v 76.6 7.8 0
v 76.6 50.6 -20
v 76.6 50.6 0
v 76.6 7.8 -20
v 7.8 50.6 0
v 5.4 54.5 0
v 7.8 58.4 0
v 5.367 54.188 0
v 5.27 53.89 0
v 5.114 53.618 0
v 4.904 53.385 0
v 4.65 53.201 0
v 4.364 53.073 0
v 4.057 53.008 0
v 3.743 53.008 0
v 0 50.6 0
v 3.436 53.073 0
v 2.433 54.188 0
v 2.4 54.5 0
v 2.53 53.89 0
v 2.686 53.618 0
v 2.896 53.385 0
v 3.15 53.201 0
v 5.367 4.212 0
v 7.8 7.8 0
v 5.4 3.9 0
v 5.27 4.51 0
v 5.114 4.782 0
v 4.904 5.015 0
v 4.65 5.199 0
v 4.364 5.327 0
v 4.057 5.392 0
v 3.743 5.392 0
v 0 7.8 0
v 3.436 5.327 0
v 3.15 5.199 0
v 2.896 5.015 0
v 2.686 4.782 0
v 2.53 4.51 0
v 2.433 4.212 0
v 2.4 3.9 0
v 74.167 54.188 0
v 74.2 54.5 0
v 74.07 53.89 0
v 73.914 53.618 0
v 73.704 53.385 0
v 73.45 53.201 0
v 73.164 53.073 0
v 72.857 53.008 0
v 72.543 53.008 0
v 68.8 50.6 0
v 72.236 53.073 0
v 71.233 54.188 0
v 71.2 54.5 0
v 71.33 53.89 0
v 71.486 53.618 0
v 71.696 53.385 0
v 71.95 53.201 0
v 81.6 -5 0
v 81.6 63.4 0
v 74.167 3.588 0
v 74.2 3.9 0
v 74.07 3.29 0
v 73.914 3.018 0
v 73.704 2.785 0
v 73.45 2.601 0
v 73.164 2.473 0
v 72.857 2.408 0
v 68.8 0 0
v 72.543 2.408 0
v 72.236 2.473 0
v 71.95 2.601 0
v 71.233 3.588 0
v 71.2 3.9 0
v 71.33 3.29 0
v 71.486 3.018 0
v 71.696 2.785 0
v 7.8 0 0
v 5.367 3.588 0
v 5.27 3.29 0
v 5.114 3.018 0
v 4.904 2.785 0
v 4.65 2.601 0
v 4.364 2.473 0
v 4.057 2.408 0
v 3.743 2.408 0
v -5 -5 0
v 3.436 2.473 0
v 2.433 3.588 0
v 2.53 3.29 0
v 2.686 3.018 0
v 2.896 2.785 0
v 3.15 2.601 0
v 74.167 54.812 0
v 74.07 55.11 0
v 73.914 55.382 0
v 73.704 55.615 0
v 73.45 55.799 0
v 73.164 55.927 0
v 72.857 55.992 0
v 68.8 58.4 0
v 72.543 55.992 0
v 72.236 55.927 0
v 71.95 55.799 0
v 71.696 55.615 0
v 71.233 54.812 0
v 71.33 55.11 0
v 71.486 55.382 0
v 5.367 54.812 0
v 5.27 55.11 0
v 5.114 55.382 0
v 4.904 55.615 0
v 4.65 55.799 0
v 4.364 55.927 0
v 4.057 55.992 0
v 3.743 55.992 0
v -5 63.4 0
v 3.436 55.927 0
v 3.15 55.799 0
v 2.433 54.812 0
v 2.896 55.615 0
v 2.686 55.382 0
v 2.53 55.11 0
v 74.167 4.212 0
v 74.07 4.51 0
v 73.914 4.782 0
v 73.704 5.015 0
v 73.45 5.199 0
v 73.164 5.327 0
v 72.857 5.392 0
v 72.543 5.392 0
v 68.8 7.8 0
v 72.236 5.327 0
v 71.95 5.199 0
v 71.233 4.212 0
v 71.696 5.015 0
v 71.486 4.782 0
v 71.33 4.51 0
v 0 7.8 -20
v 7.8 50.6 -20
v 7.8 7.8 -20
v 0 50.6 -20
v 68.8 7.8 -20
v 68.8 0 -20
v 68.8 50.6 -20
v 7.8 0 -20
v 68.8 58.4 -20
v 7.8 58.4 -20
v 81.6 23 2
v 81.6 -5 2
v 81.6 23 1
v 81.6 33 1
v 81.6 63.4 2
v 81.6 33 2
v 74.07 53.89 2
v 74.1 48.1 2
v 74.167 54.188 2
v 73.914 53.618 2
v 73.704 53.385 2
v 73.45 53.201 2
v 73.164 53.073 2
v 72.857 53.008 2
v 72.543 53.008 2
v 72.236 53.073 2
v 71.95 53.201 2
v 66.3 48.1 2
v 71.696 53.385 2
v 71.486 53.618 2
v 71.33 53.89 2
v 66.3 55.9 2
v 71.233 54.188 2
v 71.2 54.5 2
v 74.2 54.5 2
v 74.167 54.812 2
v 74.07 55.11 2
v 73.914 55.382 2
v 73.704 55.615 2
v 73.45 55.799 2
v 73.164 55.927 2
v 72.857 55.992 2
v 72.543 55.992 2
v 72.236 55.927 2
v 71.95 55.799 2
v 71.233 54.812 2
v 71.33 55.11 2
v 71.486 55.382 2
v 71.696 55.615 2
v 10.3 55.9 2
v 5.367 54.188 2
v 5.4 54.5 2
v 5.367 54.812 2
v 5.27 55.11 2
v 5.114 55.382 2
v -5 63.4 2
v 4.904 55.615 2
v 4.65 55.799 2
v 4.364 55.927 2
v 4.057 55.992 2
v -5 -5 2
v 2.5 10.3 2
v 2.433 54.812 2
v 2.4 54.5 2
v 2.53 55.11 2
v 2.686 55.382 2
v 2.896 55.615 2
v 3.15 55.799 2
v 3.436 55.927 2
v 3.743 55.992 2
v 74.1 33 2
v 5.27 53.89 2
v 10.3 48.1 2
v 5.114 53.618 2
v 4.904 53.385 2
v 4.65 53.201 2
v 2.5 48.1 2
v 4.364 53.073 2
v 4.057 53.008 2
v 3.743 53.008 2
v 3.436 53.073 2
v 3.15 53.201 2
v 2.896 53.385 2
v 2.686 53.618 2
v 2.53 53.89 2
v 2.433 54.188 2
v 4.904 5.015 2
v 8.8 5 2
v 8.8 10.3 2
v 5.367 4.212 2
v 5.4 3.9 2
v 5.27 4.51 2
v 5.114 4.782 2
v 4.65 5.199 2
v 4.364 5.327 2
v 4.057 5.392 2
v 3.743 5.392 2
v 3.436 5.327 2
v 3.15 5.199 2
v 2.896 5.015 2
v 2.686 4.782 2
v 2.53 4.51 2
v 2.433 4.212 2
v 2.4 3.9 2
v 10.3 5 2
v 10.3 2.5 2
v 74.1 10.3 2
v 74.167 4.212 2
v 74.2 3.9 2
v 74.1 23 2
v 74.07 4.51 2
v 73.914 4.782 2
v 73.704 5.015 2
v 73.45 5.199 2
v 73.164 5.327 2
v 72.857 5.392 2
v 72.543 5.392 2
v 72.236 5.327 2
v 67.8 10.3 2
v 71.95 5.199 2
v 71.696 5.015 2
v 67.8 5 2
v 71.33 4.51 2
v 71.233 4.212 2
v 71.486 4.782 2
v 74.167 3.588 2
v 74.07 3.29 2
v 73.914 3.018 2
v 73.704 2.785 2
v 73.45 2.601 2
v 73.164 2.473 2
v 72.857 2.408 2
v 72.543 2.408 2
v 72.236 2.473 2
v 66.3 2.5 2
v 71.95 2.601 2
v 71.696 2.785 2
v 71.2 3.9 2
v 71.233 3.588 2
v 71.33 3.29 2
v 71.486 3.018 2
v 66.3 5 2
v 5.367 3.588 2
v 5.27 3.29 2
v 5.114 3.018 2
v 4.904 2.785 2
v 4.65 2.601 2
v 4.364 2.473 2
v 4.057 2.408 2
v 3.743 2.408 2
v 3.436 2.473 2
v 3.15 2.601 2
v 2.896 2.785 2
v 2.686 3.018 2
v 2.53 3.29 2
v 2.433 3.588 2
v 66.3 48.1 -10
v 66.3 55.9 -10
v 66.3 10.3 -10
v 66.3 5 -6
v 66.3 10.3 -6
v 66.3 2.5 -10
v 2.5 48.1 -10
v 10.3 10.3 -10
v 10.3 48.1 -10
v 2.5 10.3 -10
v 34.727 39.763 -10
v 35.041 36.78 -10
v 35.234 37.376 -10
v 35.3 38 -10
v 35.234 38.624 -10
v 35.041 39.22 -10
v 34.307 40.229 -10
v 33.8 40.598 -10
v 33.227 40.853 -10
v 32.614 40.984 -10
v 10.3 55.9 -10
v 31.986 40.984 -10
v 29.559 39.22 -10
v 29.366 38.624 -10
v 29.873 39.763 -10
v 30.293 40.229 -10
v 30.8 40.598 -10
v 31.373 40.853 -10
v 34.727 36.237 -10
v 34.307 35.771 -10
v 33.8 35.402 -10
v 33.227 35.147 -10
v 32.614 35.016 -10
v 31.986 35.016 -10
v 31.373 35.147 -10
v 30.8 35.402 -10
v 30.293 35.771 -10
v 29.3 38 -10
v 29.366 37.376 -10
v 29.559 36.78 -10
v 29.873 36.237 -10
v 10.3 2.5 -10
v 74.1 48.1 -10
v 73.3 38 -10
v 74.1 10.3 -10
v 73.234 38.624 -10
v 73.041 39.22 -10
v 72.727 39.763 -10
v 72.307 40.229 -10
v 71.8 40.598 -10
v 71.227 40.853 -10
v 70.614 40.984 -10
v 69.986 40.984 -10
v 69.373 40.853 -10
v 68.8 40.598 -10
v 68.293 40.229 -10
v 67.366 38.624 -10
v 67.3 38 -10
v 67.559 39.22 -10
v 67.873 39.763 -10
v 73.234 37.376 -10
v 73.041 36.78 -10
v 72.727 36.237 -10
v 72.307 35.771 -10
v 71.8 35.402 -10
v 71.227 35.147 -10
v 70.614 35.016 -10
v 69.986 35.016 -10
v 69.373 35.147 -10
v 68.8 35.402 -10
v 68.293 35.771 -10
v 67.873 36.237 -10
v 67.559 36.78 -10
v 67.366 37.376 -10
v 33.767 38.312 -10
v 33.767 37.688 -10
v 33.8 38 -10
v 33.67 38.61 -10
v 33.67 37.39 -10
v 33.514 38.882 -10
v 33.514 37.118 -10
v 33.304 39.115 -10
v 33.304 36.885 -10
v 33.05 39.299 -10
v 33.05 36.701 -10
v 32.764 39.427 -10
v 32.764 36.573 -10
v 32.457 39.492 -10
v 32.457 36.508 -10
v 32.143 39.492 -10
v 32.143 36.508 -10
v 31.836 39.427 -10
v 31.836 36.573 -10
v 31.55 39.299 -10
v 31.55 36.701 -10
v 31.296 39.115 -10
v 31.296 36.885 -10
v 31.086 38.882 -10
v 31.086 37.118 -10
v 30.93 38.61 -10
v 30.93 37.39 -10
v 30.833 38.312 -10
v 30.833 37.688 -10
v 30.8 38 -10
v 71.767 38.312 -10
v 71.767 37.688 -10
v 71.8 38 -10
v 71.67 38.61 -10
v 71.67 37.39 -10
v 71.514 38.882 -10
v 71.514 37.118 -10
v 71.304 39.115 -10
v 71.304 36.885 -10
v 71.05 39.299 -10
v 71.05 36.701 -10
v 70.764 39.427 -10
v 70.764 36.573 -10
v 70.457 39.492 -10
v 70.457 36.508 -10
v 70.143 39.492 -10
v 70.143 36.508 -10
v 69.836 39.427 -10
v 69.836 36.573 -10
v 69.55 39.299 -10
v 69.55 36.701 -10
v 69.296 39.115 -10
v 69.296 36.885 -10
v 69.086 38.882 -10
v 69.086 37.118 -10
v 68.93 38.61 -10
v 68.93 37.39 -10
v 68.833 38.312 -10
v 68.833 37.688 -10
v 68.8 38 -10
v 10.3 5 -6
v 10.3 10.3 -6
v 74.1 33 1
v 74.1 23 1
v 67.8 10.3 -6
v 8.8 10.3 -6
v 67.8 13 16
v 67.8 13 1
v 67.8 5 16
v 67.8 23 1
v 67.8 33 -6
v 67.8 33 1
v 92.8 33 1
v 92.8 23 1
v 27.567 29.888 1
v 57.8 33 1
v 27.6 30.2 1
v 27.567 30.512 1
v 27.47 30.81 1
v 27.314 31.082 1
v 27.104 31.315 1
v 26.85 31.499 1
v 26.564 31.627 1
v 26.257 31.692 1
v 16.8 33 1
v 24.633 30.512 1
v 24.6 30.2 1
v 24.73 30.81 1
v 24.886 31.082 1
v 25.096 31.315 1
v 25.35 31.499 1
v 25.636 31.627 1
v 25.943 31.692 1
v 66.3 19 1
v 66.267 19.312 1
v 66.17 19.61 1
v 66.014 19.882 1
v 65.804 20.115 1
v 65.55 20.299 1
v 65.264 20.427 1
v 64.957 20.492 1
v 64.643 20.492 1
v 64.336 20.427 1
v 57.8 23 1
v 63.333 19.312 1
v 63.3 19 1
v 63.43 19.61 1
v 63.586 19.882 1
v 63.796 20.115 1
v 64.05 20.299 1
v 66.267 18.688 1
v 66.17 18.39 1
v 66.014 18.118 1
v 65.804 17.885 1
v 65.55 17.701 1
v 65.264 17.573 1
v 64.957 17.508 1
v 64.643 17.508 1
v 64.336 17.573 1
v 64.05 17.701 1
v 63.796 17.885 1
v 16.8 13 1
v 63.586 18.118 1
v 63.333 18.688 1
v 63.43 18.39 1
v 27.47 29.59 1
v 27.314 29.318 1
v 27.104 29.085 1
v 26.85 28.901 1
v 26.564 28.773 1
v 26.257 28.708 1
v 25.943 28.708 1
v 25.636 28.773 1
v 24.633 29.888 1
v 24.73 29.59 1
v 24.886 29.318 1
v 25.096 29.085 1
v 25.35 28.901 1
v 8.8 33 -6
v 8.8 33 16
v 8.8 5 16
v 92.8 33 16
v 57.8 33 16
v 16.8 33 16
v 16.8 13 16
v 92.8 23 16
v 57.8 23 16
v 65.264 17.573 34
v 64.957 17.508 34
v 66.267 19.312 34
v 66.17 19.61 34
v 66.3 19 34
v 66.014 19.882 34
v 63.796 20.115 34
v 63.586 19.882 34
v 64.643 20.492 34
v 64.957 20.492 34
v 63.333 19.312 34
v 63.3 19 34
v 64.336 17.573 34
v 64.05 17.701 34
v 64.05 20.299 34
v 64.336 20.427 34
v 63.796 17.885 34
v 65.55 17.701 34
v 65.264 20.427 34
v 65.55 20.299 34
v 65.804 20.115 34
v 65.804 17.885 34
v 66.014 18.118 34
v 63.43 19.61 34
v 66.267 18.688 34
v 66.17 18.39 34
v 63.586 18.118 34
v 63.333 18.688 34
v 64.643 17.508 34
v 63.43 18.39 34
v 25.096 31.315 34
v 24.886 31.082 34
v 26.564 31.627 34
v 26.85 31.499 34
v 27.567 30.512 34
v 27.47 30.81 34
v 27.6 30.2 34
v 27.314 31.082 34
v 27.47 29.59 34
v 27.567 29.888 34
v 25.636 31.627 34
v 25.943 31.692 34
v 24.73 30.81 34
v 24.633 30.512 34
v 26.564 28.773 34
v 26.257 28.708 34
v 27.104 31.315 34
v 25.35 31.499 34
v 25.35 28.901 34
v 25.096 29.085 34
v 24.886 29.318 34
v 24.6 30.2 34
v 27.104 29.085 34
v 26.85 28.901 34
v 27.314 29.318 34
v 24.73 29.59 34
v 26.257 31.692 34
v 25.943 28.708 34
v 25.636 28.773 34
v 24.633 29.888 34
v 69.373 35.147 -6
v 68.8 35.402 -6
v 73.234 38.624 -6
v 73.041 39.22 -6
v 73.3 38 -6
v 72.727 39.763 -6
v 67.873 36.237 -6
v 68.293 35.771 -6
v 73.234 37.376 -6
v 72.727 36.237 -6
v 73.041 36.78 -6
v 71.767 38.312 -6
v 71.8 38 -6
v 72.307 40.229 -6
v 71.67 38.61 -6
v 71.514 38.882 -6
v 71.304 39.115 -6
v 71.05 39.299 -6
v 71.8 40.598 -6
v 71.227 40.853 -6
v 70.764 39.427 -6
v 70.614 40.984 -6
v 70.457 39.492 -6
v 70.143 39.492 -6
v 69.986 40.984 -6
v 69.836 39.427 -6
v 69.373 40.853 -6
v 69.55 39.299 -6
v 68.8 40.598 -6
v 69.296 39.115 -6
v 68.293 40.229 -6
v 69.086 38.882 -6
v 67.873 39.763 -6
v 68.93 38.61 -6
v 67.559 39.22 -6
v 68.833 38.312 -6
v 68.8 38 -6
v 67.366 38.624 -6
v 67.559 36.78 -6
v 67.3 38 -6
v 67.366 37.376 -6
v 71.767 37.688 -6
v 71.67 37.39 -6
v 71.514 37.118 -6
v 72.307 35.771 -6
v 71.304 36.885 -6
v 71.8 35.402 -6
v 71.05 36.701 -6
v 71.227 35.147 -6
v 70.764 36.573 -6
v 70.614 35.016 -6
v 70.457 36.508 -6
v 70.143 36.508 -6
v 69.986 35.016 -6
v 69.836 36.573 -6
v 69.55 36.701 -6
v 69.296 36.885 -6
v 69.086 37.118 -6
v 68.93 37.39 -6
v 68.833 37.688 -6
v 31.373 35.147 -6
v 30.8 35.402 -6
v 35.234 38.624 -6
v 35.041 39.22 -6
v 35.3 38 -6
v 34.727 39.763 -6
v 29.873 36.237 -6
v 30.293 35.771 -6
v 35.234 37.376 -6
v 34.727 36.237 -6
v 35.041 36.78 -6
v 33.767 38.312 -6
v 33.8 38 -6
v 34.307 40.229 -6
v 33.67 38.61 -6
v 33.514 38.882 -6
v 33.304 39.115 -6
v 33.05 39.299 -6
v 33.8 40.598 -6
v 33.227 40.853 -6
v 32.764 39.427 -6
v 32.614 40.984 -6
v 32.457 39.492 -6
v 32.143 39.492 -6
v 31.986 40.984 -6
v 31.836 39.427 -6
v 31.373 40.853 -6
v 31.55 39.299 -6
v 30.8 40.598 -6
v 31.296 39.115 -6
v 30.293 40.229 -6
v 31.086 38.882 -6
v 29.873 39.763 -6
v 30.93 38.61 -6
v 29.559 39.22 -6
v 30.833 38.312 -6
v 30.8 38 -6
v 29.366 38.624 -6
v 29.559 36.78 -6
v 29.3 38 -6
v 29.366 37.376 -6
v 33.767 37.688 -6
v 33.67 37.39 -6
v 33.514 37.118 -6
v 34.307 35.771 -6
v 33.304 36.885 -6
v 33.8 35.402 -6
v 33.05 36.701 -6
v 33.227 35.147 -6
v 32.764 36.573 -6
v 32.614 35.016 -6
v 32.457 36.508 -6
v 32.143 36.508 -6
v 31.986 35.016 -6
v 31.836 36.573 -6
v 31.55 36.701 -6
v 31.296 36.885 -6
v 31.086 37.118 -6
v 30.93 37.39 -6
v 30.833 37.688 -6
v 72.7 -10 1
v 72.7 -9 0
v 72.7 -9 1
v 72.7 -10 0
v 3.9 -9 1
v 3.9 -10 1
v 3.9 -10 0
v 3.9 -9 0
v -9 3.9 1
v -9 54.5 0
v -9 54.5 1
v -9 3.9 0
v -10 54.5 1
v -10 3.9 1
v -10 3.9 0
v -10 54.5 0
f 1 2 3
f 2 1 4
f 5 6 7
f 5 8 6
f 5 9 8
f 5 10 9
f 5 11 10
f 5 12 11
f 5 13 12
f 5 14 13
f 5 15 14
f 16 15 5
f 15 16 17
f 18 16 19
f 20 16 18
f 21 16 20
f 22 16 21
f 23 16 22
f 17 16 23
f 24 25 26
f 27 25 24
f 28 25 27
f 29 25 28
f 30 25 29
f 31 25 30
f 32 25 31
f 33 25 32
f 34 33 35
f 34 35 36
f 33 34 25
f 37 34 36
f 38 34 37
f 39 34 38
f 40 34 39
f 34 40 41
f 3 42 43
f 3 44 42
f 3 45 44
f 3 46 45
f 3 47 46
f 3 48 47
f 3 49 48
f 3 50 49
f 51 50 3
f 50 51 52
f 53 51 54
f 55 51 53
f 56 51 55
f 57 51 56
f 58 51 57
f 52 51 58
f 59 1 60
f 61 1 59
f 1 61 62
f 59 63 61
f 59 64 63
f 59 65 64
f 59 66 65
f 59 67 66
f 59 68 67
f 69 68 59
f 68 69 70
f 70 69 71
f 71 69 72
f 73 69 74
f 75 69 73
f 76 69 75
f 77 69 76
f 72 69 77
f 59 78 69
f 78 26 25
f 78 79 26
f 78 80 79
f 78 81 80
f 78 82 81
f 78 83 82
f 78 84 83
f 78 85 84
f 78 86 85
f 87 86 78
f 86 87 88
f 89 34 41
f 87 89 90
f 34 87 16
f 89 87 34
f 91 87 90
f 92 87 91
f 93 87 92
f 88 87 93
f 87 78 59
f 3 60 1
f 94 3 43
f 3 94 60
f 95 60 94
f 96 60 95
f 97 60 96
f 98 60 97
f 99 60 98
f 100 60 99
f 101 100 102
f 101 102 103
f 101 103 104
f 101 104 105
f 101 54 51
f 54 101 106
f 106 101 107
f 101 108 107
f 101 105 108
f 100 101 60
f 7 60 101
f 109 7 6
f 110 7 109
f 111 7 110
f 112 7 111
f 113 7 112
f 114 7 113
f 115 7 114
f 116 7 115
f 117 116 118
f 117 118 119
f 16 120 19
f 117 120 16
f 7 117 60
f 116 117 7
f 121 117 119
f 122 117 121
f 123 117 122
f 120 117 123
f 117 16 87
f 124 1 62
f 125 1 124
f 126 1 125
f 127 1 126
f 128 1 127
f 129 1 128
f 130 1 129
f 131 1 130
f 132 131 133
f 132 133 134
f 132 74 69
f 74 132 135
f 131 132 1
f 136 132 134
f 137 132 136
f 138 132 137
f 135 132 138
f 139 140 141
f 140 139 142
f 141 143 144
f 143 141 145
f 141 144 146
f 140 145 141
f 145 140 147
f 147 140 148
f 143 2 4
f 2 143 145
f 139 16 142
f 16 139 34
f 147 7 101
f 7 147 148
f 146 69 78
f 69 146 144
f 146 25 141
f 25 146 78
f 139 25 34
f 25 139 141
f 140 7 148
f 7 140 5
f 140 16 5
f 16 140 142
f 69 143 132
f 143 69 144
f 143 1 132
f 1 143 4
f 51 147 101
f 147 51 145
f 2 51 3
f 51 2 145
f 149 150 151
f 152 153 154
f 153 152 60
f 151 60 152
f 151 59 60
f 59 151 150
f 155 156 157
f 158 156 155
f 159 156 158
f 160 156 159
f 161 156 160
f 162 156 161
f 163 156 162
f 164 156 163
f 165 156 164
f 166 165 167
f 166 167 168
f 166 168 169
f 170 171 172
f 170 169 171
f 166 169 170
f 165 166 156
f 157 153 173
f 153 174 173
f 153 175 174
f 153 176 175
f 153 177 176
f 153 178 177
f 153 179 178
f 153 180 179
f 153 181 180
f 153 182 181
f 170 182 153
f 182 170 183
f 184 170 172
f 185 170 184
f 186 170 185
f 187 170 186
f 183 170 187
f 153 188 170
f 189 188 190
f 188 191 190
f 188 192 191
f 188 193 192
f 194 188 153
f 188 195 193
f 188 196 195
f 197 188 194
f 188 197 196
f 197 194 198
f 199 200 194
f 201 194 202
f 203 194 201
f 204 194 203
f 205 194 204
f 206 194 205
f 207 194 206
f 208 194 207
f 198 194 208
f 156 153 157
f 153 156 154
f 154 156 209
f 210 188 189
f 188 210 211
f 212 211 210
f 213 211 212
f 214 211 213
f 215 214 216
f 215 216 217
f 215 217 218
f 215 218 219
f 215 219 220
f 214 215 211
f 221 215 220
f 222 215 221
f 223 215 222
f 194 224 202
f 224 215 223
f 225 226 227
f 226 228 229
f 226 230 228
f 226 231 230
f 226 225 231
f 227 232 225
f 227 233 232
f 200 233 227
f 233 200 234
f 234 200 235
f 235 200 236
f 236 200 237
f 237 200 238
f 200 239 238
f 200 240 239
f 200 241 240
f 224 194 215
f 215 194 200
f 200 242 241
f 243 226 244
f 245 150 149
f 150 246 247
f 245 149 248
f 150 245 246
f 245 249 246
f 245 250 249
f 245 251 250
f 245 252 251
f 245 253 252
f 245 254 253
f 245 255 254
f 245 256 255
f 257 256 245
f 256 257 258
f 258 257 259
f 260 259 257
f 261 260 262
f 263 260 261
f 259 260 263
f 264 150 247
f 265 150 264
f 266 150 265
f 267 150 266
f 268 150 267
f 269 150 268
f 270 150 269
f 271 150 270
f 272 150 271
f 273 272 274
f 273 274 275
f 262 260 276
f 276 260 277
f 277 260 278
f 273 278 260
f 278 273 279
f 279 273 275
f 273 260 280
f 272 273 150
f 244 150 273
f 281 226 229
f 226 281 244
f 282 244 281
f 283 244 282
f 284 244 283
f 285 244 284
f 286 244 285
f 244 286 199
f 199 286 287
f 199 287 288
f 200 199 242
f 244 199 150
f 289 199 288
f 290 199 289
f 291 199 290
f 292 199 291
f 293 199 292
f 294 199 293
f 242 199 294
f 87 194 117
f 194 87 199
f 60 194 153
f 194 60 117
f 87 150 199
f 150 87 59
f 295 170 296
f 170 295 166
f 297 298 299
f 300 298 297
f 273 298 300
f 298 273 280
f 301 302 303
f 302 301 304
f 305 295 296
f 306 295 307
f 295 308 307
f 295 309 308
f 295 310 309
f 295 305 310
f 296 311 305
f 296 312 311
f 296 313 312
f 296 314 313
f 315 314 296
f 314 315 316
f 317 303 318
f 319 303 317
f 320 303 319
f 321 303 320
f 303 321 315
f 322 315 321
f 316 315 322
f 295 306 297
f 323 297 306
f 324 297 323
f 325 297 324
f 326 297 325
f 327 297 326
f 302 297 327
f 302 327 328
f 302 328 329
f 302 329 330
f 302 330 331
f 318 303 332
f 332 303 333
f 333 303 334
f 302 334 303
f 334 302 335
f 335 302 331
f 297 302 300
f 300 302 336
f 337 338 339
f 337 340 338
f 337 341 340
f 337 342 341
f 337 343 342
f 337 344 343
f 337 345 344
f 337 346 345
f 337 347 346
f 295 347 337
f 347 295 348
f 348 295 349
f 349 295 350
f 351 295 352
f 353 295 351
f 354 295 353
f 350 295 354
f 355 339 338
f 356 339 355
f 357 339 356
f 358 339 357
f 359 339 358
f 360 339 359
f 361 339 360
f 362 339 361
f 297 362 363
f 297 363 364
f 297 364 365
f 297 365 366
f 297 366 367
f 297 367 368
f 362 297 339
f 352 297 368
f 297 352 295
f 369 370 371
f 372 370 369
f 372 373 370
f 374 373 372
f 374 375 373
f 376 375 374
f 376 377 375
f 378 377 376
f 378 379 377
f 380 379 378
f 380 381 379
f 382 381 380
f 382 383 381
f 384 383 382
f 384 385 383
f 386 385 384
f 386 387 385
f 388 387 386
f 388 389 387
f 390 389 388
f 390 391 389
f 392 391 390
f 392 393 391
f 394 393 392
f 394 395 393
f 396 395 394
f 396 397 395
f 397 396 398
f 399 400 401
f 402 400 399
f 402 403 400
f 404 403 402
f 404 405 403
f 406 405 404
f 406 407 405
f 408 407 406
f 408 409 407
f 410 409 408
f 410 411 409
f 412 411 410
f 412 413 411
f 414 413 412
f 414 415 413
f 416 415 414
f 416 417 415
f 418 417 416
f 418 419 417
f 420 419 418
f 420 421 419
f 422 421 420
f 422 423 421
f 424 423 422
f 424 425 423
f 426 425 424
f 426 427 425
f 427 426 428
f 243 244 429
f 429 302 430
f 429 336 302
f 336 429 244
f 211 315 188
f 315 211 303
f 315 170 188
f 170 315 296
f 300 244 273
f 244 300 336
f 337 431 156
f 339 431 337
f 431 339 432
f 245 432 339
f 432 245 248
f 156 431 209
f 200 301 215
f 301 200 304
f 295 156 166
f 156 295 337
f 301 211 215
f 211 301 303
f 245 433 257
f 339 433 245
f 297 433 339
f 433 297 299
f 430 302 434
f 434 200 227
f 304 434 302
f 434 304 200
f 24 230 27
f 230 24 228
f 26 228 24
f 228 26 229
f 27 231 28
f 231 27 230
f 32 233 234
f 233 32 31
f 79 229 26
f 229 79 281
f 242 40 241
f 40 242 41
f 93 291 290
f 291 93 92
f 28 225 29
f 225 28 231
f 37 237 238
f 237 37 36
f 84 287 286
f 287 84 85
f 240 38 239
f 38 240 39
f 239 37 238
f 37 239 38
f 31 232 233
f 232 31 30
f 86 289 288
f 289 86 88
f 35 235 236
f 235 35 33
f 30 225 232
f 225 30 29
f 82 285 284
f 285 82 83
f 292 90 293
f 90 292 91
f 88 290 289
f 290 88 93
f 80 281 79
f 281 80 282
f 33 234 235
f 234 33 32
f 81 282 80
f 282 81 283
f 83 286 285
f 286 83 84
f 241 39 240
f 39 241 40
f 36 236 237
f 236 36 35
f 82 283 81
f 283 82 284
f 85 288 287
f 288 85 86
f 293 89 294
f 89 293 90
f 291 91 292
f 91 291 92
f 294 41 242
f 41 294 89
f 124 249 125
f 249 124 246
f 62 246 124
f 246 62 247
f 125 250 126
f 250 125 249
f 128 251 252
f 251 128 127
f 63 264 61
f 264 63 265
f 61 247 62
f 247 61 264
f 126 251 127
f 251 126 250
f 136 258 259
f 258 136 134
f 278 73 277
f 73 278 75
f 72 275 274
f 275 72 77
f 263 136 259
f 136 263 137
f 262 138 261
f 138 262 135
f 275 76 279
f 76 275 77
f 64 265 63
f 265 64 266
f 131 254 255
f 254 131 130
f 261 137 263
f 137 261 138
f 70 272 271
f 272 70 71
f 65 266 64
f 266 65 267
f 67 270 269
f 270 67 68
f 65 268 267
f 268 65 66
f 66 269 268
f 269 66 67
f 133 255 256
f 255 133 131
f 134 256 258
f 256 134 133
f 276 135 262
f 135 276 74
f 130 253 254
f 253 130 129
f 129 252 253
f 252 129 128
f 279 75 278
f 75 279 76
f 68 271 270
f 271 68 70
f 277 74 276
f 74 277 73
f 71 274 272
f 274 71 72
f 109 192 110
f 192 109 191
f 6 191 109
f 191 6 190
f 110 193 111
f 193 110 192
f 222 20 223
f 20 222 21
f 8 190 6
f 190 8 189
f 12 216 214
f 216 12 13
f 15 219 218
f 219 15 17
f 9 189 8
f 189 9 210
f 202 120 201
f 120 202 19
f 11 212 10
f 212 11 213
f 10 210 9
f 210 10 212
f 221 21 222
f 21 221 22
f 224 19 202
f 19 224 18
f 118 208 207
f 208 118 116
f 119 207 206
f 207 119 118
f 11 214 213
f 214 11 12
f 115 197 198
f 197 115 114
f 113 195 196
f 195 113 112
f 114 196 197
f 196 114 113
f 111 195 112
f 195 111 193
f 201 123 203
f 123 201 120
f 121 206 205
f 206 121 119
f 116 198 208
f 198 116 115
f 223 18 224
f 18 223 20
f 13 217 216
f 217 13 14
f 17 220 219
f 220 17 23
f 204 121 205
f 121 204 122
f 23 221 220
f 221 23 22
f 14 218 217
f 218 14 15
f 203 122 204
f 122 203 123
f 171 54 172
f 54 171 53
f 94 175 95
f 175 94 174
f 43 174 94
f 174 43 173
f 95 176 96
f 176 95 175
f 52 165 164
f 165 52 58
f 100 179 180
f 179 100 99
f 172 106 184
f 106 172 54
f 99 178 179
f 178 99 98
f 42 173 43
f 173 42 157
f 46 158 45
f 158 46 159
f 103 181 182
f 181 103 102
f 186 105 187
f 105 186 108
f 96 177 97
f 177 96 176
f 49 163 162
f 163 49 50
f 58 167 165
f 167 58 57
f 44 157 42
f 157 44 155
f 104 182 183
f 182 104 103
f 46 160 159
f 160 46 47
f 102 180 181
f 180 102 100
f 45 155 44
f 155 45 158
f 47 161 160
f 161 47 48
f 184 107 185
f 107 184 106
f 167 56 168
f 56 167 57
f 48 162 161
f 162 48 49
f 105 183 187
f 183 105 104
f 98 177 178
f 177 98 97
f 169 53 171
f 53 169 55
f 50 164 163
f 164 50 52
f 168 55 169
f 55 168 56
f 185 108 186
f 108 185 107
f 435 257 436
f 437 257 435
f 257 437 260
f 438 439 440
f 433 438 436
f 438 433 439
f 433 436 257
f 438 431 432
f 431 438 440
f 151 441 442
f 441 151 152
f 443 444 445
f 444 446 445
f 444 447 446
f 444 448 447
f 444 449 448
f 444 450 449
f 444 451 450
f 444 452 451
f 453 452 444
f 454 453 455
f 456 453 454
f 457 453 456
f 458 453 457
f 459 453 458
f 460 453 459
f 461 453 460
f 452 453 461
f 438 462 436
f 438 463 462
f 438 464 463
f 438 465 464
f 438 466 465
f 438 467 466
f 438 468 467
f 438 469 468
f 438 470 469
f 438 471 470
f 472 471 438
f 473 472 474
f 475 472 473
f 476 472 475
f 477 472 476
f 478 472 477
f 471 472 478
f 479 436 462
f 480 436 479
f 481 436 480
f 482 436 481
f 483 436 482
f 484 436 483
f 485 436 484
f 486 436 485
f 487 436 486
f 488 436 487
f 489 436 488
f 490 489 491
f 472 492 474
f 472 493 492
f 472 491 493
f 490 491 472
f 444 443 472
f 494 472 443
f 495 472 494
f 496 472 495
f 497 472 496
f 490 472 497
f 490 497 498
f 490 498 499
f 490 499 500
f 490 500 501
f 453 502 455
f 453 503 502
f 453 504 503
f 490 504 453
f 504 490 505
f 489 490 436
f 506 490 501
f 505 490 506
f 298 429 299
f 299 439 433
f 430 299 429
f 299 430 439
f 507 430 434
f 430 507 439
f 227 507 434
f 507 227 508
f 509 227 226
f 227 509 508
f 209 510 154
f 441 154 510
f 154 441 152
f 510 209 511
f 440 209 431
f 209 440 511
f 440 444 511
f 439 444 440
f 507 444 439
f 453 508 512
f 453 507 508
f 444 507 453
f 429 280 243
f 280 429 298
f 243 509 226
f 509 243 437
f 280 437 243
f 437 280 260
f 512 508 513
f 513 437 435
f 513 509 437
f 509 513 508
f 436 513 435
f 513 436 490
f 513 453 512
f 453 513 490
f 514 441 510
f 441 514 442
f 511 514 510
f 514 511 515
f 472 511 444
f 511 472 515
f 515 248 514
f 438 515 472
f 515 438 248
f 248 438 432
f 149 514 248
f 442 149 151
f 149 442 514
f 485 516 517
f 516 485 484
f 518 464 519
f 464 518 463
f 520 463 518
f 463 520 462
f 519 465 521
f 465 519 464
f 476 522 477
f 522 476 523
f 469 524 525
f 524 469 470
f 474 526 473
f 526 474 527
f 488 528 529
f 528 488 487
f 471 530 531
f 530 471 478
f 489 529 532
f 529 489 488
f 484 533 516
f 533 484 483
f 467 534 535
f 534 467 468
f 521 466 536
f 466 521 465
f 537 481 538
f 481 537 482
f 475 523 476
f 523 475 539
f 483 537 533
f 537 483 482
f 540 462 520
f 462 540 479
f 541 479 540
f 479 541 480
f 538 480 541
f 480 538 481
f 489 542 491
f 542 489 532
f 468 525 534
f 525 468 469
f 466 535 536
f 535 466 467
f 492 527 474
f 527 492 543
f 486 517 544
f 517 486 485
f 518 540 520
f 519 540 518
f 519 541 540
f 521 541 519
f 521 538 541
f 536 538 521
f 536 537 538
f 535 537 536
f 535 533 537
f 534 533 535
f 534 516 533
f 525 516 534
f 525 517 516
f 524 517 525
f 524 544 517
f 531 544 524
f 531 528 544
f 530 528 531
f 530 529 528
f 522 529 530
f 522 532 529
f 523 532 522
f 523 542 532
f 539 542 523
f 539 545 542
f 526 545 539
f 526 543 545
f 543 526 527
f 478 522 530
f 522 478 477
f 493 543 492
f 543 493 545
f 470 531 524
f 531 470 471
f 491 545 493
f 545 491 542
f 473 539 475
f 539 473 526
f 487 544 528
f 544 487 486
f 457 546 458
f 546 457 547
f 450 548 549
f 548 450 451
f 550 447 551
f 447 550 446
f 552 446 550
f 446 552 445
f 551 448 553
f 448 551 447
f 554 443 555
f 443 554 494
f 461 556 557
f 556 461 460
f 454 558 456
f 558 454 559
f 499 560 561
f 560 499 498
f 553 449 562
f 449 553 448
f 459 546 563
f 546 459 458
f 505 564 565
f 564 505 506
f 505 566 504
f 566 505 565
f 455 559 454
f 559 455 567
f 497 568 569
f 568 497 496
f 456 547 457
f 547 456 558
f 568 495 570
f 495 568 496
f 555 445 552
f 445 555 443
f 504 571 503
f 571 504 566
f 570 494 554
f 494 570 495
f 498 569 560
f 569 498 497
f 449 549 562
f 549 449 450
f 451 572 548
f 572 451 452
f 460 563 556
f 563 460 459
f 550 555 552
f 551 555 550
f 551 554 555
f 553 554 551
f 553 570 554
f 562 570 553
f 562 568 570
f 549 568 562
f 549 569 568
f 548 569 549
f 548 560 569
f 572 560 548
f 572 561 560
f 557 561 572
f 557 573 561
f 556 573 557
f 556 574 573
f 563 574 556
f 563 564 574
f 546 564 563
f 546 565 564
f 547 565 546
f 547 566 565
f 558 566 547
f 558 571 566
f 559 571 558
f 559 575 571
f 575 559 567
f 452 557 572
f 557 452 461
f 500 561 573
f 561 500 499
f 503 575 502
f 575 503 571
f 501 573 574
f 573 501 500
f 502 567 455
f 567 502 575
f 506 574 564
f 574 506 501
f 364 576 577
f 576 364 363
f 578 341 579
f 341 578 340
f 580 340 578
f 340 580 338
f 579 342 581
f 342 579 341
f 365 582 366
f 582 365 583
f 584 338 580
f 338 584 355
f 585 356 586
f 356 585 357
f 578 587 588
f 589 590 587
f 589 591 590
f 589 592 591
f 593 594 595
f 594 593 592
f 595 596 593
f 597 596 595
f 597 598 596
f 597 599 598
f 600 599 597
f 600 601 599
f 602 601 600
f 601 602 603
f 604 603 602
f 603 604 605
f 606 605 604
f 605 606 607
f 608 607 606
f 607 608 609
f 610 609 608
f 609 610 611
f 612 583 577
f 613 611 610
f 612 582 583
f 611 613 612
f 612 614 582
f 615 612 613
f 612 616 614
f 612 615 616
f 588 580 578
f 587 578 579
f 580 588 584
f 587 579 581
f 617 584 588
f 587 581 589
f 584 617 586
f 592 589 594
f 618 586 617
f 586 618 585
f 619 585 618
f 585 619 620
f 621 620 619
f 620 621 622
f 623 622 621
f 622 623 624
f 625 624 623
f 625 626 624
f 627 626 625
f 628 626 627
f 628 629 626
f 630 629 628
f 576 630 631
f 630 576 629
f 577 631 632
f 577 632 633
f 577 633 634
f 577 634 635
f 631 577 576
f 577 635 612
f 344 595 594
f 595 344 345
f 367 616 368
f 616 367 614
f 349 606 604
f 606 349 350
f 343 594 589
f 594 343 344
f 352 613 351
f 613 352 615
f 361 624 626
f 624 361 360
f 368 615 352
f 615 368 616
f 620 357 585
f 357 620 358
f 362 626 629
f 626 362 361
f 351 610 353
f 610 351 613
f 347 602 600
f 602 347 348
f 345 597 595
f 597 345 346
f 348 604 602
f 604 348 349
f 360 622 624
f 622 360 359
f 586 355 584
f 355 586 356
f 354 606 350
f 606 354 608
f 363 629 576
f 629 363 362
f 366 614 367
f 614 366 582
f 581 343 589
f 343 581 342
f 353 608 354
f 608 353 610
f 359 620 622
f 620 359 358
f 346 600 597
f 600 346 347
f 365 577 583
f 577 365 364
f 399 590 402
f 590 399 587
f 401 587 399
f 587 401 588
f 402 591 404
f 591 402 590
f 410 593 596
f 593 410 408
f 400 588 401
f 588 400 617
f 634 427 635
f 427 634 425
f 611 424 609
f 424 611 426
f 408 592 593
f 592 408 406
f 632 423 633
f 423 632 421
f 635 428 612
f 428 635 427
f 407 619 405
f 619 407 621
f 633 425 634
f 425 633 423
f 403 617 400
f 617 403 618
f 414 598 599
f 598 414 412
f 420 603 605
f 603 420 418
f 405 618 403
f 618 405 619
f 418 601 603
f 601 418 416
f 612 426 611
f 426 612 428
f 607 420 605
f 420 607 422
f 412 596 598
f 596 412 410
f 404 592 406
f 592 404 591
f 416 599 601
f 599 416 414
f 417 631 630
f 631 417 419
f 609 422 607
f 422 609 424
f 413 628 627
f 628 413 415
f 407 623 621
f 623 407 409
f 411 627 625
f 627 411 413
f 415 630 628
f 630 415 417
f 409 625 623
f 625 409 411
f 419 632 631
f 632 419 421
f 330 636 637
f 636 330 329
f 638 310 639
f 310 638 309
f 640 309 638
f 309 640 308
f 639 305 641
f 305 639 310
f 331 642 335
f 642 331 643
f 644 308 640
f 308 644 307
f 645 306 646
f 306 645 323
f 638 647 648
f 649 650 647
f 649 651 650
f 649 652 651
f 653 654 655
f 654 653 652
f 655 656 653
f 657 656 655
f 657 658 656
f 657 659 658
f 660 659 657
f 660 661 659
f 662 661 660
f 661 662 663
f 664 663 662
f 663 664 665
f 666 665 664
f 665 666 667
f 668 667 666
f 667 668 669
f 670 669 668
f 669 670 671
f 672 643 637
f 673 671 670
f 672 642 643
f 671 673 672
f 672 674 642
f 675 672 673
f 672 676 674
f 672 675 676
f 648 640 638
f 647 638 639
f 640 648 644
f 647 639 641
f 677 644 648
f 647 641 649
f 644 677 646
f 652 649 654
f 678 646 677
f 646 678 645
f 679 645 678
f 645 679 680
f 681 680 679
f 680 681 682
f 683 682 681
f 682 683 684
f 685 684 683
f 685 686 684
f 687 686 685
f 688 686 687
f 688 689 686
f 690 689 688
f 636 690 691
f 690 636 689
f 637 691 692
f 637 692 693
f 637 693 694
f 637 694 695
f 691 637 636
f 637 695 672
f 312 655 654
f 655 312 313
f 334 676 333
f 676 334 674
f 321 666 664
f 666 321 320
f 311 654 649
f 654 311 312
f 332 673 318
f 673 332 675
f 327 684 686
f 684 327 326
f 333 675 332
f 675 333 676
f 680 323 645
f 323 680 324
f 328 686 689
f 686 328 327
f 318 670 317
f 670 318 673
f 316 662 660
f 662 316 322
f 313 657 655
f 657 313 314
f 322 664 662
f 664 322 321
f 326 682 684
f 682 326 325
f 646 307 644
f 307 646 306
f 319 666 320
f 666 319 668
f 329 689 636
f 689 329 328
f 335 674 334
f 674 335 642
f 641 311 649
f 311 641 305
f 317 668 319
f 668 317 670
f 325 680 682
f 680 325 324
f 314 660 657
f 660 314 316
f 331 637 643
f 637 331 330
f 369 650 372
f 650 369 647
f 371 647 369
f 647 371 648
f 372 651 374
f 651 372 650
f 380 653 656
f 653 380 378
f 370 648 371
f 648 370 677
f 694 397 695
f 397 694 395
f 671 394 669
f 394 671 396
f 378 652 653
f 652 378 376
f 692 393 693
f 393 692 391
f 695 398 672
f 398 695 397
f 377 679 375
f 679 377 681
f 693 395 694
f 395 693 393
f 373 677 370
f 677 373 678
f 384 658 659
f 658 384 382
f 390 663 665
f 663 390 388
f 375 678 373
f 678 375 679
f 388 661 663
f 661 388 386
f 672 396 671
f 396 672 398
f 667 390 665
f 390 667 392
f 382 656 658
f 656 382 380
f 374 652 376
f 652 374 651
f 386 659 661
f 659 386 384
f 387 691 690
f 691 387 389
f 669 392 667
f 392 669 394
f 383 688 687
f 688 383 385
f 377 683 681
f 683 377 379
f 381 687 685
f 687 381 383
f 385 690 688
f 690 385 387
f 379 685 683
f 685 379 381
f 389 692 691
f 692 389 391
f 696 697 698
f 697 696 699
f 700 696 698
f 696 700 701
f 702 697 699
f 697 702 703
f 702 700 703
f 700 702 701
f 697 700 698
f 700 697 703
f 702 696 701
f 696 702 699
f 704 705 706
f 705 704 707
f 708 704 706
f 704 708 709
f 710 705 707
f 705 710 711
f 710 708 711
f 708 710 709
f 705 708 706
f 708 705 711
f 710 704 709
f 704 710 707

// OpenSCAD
cornerInset = 7.8;
innerX = 61;
innerY = 42.8;
outerX = innerX + 2 * cornerInset;
outerY = innerY + 2 * cornerInset;

lipWidth = 5;
rimHeight = 2;
trayDepth = 15;
trayBottomThickness = 5;
trayWallThickness = 2.5;

boardX = 59;
boardY = 28;
boardOffsetX = 10;

// from outer edge of inset
screwOffsetX = 3.6;         
screwOffsetY = 3.6;

screwDiameter = 3;
standoffHeight = trayDepth - 6;

//
// NOTE: distance between inner corners is off, board should fit snugly between them...
//

module corneredTray() {
    color("pink") 
    difference() {
        
        // the box
        translate([0,0,-(trayDepth + trayBottomThickness)])
            cube([outerX, outerY, trayDepth + trayBottomThickness]);
        
        // cut out corners
        translate([-1,-1,-(trayDepth + trayBottomThickness + 1)])
            cube([cornerInset+1, cornerInset+1, 2 * trayDepth]);
        translate([-1, outerY - cornerInset ,-(trayDepth + trayBottomThickness + 1)])
            cube([cornerInset+1, cornerInset+1, 2 * trayDepth]);
        translate([outerX - cornerInset,-1,-(trayDepth + trayBottomThickness + 1)])
            cube([cornerInset+1, cornerInset+1, 2 * trayDepth]);
        translate([outerX - cornerInset, outerY - cornerInset ,-(trayDepth + trayBottomThickness + 1)])
            cube([cornerInset+1, cornerInset+1, 2 * trayDepth]);
        
    }
    
    // the rim on top of the box
    translate([-lipWidth, -lipWidth, 0]) 
        cube([outerX + 2*lipWidth, outerY + 2*lipWidth, rimHeight]);
        
}

module fullTrayShell() {
    difference() {
        corneredTray();
        
        // cut out inner horizontal
        translate([cornerInset + trayWallThickness, trayWallThickness,-(trayDepth-trayBottomThickness)])
           cube([outerX - 2*cornerInset - 2*trayWallThickness, 
                 outerY -  2*trayWallThickness, 
                 trayDepth+1]);
        
        // cut out inner vertical
        translate([trayWallThickness, cornerInset + trayWallThickness,-(trayDepth - trayBottomThickness)])
           cube([outerX - 2*trayWallThickness, 
                 outerY - 2*cornerInset - 2*trayWallThickness, 
                 trayDepth]);

    }
}


module screwHole() {
    cylinder(r=1.5, h= 2 * (trayDepth + trayBottomThickness), $fn=30);
}

module screwHoles() {
    translate([cornerInset/2, cornerInset/2, -(trayDepth + trayBottomThickness + 1)])
        screwHole();
    translate([outerX - cornerInset/2, cornerInset/2, -(trayDepth + trayBottomThickness + 1)])
        screwHole();
    translate([cornerInset/2, outerY - cornerInset/2, -(trayDepth + trayBottomThickness + 1)])
        screwHole();
    translate([outerX  - cornerInset/2, outerY - cornerInset/2, -(trayDepth + trayBottomThickness + 1)])
        screwHole();
}

module standoff() {
    difference() {
        cylinder(r = screwDiameter, h = standoffHeight, $fn=30);
        screwHole();
    }
}

module standoffs() {
    // ???
    translate([17.3 + 38 + boardOffsetX + lipWidth, lipWidth + cornerInset + boardY - 2.8, -trayDepth])
        standoff();
    translate([17.3 + boardOffsetX + lipWidth, lipWidth + cornerInset + boardY - 2.8, -trayDepth])
        standoff();
}



difference() {

    fullTrayShell();
    screwHoles();
}

translate([cornerInset + 1, 5, -(trayDepth - standoffHeight)])
    board();

// board simulation
module board() {
    
    // pcb
    color("green") cube([59,28,7]);
    
    // servo plugs
    translate([0,0,7])
        color("yellow")
            cube([59,8,15]);
    translate([0, 8,7])
        color("yellow")
            cube([8, 28-8, 15]); 
    translate([5,2, 15+7])
        color("black")
            text(size = 4, "servo connectors");
     
    // usb
    translate([59-10, 18,7]) {
        color("black") 
            cube([35, 10, 15]);
        translate([6,4,15])
            color("white") 
                text(size=4, "usb");
    }
    
    translate([59-3, 14, 0])
        screwHole();
  
    translate([17.3, 28-2.8, 0])
        screwHole();
  
 
}


translate([cornerInset/2,-10, 0])
    cube([innerX+cornerInset, 1, 1]);

translate([-10, cornerInset/2, 0])
    cube([1, innerY+cornerInset, 1]);

standoffs();
